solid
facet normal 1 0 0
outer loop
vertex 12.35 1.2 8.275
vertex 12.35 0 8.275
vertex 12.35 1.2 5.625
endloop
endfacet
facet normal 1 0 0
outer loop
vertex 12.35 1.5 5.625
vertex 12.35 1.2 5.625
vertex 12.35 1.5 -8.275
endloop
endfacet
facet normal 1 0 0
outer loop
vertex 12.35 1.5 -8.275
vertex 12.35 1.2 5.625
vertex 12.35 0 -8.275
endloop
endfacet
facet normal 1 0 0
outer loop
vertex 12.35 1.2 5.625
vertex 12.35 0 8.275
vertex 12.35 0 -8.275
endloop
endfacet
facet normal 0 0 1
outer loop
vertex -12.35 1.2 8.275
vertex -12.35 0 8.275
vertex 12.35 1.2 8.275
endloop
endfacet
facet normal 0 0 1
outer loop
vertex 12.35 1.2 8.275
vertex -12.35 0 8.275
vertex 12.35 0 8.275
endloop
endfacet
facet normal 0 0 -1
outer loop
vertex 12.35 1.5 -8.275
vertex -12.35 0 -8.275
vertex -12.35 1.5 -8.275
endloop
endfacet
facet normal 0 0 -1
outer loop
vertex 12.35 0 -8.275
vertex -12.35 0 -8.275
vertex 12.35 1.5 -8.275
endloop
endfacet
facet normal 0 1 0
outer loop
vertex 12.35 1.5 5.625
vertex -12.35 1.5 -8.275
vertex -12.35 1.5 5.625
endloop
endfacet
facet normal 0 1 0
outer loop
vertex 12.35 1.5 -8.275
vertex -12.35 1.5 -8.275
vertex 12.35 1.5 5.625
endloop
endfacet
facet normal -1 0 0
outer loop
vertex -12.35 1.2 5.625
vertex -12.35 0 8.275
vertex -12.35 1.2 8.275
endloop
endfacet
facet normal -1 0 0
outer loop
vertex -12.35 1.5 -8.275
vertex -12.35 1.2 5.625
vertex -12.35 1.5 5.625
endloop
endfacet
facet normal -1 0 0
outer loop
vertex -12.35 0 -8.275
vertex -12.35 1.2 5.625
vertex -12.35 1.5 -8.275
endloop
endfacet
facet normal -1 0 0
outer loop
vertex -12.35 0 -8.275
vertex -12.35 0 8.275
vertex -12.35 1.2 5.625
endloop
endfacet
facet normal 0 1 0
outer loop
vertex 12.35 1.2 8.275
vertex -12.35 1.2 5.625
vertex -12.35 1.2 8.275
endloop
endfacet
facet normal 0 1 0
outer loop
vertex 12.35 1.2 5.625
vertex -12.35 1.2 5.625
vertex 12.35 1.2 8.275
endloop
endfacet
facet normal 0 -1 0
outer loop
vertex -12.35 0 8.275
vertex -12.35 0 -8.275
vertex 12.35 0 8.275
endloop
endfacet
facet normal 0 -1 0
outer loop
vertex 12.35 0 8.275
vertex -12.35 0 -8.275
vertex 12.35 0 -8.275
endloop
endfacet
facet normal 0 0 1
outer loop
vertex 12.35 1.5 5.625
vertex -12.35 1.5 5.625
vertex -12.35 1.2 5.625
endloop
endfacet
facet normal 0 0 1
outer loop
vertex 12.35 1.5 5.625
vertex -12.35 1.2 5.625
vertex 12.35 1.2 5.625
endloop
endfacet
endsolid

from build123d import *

# Parameters (mm, degrees)
SKETCH1_W           = 24.7
SKETCH1_H           = 16.55
BOSS_EXTRUDE1_DEPTH = 1.5
SKETCH2_W           = 24.7
SKETCH2_H           = 2.65
CUT_EXTRUDE1_DEPTH  = 0.3


with BuildPart() as part:
    # Sketch1 → Boss-Extrude1 (new body)
    with BuildSketch(Plane(origin=(0, 0, 0), x_dir=(1, 0, 0), z_dir=(0, 1, 0))):
        Rectangle(SKETCH1_W, SKETCH1_H)
    extrude(amount=BOSS_EXTRUDE1_DEPTH)

    # Sketch2 → Cut-Extrude1 (cut)
    with BuildSketch(Plane(origin=(0, 1.5, 0), x_dir=(1, 0, 0), z_dir=(0, 1, 0))):
        with Locations((0, -6.95)):
            Rectangle(SKETCH2_W, SKETCH2_H)
    extrude(amount=-CUT_EXTRUDE1_DEPTH, mode=Mode.SUBTRACT)


solid = part.part
